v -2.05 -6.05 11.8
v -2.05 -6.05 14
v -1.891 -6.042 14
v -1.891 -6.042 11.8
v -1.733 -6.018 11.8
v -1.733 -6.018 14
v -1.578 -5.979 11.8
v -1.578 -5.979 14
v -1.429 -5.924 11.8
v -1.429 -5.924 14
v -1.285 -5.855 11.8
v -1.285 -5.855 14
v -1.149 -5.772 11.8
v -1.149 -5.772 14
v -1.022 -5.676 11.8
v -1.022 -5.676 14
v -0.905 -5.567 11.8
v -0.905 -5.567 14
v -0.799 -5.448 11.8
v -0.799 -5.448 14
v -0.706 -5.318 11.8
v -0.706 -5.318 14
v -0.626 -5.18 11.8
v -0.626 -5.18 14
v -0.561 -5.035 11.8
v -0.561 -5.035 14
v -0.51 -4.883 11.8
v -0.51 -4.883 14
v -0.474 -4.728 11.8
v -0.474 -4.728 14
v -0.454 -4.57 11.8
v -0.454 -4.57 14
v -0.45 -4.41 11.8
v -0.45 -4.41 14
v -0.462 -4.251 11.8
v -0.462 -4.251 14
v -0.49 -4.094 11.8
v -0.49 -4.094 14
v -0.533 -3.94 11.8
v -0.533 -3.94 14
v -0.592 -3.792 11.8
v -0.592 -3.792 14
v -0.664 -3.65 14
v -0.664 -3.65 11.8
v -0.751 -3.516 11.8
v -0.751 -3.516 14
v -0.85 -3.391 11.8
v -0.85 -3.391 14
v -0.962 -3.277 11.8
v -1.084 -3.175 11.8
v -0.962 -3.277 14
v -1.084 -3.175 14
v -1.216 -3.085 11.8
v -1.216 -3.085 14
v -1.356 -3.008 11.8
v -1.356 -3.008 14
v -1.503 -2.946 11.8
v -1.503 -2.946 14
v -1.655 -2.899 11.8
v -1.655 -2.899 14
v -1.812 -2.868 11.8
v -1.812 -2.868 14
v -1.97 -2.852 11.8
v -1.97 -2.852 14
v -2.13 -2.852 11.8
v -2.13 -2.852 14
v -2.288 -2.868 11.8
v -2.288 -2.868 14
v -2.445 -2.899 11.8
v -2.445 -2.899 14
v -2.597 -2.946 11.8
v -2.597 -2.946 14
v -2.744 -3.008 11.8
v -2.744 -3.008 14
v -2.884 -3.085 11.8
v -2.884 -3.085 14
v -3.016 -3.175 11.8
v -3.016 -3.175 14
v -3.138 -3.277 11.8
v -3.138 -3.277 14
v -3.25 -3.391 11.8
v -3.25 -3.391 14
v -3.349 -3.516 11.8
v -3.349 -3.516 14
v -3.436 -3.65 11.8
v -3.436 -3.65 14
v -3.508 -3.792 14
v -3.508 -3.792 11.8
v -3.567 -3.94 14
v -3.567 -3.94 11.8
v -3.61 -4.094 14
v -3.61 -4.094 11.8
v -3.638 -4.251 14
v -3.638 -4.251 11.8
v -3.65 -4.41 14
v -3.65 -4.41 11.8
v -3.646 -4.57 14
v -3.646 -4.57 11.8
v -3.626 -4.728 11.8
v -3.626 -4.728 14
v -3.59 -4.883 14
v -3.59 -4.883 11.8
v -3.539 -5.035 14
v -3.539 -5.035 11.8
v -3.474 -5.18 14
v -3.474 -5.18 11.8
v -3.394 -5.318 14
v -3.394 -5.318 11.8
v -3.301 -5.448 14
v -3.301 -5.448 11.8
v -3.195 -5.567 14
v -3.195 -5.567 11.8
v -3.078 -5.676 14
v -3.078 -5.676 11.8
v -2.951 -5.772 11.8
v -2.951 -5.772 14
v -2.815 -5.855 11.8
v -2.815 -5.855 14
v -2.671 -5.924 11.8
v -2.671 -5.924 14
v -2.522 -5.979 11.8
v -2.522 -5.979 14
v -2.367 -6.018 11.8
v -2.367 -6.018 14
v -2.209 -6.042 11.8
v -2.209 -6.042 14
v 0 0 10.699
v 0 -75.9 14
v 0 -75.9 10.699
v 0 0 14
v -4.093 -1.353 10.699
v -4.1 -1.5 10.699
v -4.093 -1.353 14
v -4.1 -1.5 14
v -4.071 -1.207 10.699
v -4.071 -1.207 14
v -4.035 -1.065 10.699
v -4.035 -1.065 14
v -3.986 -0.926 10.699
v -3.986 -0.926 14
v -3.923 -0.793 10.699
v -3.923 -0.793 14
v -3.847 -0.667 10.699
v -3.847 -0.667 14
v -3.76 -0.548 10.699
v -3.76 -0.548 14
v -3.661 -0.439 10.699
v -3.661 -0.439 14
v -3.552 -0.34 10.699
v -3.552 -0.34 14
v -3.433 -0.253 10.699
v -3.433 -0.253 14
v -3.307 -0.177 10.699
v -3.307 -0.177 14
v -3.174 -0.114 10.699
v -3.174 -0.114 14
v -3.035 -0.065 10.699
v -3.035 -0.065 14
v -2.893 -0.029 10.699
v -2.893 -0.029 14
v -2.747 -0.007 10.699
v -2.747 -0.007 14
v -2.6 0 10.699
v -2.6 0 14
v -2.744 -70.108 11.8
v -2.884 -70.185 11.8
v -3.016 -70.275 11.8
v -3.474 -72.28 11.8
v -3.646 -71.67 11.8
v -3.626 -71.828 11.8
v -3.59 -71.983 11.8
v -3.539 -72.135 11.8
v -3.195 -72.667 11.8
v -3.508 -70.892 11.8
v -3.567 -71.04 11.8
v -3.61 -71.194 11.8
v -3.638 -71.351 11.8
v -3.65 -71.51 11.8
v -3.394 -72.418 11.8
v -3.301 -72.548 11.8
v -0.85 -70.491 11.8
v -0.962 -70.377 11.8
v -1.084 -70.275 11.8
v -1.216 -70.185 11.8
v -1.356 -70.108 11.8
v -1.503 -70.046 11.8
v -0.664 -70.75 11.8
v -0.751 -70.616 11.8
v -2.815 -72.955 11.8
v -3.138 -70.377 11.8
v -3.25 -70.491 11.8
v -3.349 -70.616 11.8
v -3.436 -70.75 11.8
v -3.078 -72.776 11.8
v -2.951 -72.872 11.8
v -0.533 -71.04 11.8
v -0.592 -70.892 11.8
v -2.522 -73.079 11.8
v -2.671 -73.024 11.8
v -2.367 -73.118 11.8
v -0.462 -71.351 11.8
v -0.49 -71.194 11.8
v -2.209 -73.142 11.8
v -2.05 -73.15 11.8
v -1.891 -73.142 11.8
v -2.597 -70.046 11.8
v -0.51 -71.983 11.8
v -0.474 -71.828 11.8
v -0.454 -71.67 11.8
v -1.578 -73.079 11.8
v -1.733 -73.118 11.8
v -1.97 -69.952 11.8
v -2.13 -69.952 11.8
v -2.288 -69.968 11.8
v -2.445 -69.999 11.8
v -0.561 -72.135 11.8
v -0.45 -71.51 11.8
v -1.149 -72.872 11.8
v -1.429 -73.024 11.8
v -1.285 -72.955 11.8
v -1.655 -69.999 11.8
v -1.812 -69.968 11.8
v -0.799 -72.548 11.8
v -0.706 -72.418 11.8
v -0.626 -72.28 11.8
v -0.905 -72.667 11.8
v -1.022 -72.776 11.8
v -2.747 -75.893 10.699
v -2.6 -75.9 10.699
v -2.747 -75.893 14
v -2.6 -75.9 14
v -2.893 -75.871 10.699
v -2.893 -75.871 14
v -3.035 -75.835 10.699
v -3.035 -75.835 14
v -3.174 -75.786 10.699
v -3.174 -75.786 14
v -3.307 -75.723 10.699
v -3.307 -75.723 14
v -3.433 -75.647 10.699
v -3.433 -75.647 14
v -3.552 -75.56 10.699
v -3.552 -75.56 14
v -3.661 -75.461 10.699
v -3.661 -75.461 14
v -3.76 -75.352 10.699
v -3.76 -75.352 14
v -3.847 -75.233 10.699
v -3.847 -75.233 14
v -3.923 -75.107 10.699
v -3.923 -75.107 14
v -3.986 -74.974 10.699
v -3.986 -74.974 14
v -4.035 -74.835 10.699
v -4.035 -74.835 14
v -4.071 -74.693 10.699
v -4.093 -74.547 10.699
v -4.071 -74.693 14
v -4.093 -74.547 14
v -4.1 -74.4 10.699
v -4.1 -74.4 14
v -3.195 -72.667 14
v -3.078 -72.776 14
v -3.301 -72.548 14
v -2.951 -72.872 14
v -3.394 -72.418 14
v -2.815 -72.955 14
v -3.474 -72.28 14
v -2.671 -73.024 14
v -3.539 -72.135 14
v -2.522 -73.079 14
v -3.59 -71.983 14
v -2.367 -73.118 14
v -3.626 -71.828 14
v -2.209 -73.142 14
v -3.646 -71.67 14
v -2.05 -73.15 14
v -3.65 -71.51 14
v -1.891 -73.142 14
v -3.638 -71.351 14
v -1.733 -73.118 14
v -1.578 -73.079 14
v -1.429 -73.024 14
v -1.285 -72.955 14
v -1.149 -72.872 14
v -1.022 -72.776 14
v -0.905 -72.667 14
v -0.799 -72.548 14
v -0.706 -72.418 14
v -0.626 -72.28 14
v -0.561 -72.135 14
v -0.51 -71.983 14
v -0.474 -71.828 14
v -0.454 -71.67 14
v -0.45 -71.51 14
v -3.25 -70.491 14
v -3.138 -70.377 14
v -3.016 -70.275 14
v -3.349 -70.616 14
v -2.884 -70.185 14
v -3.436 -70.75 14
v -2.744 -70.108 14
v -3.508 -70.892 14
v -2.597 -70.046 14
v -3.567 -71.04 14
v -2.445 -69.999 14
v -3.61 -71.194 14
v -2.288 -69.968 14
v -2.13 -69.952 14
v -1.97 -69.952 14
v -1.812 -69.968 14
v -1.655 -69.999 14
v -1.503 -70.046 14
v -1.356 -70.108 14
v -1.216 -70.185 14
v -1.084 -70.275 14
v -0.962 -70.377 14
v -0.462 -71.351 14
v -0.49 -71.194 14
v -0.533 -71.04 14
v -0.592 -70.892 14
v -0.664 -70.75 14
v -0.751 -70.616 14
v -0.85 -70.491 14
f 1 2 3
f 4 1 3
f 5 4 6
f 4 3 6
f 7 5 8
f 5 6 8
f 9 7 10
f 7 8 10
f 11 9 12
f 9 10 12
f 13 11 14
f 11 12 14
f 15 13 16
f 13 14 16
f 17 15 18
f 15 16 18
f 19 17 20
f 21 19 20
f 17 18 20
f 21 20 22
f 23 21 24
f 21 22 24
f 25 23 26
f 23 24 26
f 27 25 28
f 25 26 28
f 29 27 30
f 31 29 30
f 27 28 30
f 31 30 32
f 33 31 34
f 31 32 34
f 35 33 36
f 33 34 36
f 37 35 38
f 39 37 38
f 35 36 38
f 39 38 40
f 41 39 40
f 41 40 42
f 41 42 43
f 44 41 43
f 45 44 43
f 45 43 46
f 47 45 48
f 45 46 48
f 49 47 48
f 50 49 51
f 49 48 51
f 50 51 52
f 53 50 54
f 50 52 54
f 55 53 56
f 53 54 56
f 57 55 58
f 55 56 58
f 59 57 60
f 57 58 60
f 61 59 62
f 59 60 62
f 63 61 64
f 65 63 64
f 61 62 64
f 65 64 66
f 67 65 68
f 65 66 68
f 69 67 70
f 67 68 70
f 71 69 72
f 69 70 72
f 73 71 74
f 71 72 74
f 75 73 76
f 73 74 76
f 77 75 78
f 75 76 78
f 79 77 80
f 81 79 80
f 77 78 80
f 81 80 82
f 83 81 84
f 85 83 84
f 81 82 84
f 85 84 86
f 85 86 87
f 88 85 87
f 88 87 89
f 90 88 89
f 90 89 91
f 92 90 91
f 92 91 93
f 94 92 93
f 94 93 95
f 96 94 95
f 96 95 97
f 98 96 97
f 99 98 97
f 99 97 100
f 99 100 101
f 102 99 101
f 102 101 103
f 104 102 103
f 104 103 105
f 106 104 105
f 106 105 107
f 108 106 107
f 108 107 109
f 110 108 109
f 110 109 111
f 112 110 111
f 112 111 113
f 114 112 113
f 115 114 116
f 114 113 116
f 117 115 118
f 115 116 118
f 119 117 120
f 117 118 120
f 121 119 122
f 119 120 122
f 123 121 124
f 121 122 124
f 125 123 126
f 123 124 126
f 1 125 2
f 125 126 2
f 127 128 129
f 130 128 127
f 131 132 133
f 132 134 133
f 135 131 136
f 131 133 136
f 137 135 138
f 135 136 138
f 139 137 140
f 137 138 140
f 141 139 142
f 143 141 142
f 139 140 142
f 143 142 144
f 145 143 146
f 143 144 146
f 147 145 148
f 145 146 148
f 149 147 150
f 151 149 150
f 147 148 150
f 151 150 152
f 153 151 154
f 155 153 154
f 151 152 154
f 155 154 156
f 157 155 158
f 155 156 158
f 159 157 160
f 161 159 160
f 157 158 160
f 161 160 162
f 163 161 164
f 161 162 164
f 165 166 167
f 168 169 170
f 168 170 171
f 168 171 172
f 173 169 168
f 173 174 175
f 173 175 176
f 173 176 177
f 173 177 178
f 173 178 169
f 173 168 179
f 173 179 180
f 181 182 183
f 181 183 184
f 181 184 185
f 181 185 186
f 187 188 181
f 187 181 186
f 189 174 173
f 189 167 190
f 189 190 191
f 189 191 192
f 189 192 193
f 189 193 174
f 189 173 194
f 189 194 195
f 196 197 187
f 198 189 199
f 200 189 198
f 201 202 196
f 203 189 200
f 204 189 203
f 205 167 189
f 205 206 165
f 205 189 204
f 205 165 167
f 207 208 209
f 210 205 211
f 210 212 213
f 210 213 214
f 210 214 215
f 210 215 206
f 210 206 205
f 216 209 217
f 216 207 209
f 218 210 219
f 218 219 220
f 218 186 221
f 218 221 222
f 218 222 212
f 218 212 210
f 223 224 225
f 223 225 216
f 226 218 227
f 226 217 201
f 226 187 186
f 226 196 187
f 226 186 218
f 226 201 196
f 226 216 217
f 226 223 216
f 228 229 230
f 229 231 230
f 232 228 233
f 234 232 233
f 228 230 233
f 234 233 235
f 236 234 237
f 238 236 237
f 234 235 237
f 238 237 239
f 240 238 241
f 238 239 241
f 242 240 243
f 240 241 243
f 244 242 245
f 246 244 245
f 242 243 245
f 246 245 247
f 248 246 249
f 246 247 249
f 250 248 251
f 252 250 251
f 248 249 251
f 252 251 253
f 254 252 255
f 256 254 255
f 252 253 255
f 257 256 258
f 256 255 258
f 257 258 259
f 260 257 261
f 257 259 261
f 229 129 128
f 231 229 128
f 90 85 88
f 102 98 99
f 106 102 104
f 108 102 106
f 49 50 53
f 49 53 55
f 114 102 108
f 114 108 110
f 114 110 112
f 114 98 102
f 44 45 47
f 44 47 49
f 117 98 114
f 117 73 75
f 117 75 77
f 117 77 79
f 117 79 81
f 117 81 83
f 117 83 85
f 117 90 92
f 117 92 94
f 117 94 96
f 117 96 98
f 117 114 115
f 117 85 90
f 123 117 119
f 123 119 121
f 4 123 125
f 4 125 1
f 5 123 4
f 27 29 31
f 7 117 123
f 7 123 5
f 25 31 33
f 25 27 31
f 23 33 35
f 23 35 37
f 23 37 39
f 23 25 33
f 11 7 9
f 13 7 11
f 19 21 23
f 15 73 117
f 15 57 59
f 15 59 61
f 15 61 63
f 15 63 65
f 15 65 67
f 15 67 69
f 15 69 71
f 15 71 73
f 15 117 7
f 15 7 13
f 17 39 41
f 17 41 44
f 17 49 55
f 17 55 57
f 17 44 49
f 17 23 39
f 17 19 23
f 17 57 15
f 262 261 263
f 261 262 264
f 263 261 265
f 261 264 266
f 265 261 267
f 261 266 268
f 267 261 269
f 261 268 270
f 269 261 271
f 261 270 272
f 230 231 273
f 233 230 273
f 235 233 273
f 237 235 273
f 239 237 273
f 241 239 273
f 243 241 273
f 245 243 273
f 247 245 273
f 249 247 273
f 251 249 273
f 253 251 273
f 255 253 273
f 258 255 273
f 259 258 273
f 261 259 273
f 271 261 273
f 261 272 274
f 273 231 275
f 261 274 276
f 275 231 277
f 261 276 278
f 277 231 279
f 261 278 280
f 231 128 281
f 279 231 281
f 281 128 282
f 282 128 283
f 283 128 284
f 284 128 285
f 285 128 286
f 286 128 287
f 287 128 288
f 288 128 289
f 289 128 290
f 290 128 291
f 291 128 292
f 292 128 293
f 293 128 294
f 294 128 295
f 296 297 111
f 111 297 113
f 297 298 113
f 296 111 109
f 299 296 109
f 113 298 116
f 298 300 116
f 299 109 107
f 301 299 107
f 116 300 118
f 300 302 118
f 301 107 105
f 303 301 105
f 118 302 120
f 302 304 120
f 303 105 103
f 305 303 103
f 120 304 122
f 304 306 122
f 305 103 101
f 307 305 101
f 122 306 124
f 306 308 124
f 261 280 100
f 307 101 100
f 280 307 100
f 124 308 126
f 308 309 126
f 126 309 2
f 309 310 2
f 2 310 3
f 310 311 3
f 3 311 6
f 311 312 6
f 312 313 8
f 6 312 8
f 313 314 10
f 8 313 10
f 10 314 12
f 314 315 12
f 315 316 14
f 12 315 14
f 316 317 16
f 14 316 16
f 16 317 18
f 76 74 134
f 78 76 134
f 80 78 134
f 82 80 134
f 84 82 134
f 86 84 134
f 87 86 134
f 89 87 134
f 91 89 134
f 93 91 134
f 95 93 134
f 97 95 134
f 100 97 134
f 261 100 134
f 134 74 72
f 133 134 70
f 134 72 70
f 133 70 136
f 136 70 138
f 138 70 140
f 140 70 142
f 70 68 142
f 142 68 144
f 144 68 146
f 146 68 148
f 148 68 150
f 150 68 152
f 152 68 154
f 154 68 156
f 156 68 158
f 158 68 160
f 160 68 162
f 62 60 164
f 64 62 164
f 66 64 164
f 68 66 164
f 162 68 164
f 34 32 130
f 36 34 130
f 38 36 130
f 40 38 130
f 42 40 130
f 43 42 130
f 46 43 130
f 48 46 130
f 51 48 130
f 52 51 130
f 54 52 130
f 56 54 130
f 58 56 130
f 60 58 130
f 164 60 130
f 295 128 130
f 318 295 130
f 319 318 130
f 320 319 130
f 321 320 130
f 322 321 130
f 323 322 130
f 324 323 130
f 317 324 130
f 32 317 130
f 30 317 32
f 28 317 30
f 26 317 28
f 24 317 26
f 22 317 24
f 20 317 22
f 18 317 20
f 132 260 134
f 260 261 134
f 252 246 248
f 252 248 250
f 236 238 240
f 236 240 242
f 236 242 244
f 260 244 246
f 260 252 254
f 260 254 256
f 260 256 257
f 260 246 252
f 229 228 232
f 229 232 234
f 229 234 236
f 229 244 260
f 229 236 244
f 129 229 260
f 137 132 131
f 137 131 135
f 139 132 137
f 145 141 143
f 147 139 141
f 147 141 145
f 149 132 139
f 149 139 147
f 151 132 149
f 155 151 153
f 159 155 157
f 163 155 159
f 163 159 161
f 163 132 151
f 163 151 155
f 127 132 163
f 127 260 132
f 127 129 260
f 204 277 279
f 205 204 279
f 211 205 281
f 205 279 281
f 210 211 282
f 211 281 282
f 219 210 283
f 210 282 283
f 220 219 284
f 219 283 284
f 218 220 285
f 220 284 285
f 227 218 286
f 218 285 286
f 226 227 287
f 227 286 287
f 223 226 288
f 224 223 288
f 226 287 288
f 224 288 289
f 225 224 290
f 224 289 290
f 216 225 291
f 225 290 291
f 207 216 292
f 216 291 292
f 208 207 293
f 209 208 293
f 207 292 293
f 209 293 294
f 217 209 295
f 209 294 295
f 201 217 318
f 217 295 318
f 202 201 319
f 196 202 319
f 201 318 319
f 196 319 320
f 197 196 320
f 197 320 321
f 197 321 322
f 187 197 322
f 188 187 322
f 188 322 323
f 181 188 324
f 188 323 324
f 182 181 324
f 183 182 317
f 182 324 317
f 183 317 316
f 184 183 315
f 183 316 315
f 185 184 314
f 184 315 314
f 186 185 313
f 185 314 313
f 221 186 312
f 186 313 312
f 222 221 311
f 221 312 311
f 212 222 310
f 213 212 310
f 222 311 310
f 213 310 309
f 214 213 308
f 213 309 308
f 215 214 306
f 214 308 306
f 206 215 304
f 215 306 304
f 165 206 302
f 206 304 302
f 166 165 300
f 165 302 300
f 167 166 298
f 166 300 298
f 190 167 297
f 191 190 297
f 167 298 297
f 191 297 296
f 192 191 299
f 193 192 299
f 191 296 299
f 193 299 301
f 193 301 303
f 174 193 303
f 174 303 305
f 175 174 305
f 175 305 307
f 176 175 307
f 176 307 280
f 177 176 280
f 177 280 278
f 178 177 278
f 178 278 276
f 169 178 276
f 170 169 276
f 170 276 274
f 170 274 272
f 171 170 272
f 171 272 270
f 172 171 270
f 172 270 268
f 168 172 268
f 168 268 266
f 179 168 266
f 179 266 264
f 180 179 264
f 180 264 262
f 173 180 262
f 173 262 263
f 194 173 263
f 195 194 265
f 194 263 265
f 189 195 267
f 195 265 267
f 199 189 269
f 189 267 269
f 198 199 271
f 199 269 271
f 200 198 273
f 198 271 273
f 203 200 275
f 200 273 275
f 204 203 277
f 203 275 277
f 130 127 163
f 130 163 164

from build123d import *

# Parameters (mm, degrees)
SKETCH010_W  = 75.9
SKETCH010_H  = 3.301254
PAD004_DEPTH = 4.1
SKETCH_R     = 1.6
POCKET_DEPTH = 2.2
FILLET_R     = 1.5


with BuildPart() as part:
    # Sketch010 → Pad004 (new body)
    with BuildSketch(Plane.YZ):
        with Locations((-37.95, 12.349373)):
            Rectangle(SKETCH010_W, SKETCH010_H)
    extrude(amount=-PAD004_DEPTH)

    # Sketch (on Face4 of Pad004) → Pocket (cut)
    with BuildSketch(Plane(origin=(0, 0, 14), x_dir=(0, -1, 0), z_dir=(0, 0, 1))):
        with Locations((4.45, -2.05)):
            Circle(SKETCH_R)
        with Locations((71.55, -2.05)):
            Circle(SKETCH_R)
    extrude(amount=-POCKET_DEPTH, mode=Mode.SUBTRACT)

    # Fillet
    fillet_edges = [part.edges().sort_by_distance(p)[0] for p in [
        (-4.1, -75.9, 12.349373),
        (-4.1, 0, 12.349373),
    ]]
    fillet(fillet_edges, radius=FILLET_R)


solid = part.part
